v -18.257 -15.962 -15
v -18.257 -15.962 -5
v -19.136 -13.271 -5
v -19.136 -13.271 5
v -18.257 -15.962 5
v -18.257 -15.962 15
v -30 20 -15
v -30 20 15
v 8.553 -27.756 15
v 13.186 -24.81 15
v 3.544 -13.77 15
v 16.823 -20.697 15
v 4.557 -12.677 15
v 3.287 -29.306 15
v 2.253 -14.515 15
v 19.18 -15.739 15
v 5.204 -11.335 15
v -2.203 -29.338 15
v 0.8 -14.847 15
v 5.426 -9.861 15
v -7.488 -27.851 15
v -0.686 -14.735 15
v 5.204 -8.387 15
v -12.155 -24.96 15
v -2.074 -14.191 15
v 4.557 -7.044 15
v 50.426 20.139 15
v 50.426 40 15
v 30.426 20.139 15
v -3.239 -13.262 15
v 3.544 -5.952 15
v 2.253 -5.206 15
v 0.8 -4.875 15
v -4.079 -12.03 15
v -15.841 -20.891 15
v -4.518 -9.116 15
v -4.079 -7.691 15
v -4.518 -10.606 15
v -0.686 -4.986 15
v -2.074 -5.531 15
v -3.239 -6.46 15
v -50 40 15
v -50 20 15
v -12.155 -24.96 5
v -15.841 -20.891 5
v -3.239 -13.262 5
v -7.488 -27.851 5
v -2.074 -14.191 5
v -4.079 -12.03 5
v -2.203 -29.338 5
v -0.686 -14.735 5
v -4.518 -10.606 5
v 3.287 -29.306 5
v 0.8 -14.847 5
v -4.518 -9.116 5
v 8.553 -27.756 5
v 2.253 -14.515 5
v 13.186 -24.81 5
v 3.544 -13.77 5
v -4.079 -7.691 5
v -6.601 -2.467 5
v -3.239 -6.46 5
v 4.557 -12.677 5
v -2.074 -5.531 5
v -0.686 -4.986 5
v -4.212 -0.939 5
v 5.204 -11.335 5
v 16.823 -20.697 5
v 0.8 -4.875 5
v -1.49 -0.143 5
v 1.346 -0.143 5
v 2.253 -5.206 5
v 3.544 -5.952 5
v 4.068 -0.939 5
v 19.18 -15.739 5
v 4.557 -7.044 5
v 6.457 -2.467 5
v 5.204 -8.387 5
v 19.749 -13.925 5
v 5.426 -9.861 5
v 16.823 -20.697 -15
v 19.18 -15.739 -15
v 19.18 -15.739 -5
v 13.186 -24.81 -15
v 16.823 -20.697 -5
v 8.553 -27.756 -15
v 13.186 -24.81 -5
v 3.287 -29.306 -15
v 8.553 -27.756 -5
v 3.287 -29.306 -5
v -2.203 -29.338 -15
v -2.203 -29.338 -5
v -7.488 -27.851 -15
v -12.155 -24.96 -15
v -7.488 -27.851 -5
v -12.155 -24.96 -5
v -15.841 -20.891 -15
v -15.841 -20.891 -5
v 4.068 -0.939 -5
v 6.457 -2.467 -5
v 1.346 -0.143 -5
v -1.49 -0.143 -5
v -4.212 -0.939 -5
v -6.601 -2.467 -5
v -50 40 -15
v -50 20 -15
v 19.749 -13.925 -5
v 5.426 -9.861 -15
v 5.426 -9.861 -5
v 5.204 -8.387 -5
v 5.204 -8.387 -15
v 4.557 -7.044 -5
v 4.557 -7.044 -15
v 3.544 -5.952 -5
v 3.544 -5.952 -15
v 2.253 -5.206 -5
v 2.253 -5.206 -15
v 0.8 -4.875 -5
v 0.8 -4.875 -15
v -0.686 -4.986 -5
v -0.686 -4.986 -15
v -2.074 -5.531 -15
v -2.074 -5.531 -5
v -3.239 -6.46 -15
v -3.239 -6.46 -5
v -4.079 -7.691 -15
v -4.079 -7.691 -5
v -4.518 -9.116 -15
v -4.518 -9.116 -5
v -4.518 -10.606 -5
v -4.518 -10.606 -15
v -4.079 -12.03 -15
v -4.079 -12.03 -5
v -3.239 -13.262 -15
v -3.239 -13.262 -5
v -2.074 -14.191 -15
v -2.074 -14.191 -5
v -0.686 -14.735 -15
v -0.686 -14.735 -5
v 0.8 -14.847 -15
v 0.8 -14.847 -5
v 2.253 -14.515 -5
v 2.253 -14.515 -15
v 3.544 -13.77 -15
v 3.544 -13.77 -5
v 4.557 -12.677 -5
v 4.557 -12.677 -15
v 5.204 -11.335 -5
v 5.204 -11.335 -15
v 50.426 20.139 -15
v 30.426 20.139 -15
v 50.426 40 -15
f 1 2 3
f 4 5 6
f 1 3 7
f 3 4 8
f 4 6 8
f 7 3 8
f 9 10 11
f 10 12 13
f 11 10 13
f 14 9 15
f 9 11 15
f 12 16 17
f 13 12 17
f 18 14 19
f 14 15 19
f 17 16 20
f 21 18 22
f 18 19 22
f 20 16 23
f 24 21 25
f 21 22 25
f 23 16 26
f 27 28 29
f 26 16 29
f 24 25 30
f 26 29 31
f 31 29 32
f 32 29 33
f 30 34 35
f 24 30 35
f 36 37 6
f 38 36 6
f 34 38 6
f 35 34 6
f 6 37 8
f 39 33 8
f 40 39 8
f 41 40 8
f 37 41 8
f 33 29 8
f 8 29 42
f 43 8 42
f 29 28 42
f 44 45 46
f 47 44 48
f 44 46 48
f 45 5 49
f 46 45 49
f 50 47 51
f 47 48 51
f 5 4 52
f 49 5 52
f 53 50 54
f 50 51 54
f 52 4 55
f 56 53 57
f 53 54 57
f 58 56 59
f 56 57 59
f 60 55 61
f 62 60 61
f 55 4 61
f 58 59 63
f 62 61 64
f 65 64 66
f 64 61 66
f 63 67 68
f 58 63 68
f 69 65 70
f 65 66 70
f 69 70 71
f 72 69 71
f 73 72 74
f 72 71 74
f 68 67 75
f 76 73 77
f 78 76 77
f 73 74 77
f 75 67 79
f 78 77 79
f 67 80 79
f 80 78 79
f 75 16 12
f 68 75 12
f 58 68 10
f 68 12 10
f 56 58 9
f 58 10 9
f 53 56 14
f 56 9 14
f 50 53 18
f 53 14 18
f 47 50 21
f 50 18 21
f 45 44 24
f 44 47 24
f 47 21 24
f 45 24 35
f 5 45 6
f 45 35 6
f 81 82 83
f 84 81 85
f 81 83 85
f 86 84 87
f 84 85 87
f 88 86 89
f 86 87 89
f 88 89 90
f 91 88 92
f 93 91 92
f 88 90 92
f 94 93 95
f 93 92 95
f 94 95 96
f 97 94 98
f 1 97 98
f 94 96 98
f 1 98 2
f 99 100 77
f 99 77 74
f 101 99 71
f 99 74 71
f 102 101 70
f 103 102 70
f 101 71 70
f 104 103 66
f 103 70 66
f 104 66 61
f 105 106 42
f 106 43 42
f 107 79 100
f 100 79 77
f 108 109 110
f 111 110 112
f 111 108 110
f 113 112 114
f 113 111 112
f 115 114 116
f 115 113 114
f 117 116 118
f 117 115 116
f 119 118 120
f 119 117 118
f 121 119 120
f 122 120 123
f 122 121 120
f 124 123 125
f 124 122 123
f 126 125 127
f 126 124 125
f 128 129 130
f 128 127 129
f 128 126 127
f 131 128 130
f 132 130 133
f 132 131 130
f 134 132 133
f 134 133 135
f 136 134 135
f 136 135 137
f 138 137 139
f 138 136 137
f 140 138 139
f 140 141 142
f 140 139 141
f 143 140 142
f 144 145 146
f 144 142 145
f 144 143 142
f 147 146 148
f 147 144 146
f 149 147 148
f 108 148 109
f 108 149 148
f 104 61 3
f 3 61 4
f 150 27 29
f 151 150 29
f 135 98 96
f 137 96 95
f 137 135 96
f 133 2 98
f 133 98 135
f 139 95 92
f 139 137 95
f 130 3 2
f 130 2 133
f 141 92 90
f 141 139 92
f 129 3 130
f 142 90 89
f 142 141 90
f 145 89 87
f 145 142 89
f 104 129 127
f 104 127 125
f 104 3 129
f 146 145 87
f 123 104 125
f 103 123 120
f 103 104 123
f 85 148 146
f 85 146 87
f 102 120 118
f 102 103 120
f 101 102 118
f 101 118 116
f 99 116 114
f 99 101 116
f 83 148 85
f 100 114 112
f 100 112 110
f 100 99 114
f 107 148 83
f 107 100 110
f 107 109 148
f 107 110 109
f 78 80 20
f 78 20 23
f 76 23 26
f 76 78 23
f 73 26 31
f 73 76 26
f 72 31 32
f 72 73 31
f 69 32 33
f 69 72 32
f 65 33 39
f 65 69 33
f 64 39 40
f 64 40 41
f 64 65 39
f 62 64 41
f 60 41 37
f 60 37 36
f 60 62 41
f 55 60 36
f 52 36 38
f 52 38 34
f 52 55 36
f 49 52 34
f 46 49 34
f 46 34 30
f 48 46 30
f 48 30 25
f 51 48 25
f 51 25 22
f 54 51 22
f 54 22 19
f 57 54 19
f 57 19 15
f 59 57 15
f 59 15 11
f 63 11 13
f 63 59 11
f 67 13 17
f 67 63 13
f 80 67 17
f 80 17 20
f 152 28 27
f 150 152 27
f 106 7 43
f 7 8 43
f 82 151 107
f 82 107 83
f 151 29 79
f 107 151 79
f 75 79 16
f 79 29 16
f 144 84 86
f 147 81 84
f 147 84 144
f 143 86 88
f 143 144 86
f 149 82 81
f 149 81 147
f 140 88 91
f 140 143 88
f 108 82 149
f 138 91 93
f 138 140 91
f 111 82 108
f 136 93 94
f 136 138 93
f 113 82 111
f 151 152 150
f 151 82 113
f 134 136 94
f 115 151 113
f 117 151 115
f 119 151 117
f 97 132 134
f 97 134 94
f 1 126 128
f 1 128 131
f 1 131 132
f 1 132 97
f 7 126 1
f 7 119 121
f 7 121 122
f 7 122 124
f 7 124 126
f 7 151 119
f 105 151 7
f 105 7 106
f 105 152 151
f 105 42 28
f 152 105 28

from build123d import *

# Parameters (mm, degrees)
SKETCH1_R          = 5
BASE_EXTRUDE_DEPTH = 15
CUT_EXTRUDE1_DEPTH = 5


with BuildPart() as part:
    # Sketch1 → Base-Extrude (new, symmetric)
    with BuildSketch(Plane.XY):
        with BuildLine():
            Line((30.426111358, 20.139143504), (19.180390516, -15.739203845))
            ThreePointArc((19.180390516, -15.739203845), (0.542906018, -29.514464646), (-18.256979683, -15.96168131))
            Line((-18.256979683, -15.96168131), (-30, 20))
            Line((-30, 20), (-50, 20))
            Line((-50, 20), (-50, 40))
            Line((-50, 40), (50.426111358, 40))
            Line((50.426111358, 40), (50.426111358, 20.139143504))
            Line((50.426111358, 20.139143504), (30.426111358, 20.139143504))
        make_face()
        with Locations((0.426111358, -9.860856496)):
            Circle(SKETCH1_R, mode=Mode.SUBTRACT)
    extrude(amount=BASE_EXTRUDE_DEPTH, both=True)

    # Sketch2 → Cut-Extrude1 (cut, symmetric)
    with BuildSketch(Plane.XY):
        with BuildLine():
            Line((-50.148365525, -40), (50.000039492, -40))
            Line((50.000039492, -40), (6.45662049, -2.46739488))
            ThreePointArc((6.45662049, -2.46739488), (-0.072081984, -0.041909569), (-6.600887406, -2.467117756))
            Line((-6.600887406, -2.467117756), (-50.148365525, -40))
        make_face()
    extrude(amount=CUT_EXTRUDE1_DEPTH, both=True, mode=Mode.SUBTRACT)


solid = part.part
